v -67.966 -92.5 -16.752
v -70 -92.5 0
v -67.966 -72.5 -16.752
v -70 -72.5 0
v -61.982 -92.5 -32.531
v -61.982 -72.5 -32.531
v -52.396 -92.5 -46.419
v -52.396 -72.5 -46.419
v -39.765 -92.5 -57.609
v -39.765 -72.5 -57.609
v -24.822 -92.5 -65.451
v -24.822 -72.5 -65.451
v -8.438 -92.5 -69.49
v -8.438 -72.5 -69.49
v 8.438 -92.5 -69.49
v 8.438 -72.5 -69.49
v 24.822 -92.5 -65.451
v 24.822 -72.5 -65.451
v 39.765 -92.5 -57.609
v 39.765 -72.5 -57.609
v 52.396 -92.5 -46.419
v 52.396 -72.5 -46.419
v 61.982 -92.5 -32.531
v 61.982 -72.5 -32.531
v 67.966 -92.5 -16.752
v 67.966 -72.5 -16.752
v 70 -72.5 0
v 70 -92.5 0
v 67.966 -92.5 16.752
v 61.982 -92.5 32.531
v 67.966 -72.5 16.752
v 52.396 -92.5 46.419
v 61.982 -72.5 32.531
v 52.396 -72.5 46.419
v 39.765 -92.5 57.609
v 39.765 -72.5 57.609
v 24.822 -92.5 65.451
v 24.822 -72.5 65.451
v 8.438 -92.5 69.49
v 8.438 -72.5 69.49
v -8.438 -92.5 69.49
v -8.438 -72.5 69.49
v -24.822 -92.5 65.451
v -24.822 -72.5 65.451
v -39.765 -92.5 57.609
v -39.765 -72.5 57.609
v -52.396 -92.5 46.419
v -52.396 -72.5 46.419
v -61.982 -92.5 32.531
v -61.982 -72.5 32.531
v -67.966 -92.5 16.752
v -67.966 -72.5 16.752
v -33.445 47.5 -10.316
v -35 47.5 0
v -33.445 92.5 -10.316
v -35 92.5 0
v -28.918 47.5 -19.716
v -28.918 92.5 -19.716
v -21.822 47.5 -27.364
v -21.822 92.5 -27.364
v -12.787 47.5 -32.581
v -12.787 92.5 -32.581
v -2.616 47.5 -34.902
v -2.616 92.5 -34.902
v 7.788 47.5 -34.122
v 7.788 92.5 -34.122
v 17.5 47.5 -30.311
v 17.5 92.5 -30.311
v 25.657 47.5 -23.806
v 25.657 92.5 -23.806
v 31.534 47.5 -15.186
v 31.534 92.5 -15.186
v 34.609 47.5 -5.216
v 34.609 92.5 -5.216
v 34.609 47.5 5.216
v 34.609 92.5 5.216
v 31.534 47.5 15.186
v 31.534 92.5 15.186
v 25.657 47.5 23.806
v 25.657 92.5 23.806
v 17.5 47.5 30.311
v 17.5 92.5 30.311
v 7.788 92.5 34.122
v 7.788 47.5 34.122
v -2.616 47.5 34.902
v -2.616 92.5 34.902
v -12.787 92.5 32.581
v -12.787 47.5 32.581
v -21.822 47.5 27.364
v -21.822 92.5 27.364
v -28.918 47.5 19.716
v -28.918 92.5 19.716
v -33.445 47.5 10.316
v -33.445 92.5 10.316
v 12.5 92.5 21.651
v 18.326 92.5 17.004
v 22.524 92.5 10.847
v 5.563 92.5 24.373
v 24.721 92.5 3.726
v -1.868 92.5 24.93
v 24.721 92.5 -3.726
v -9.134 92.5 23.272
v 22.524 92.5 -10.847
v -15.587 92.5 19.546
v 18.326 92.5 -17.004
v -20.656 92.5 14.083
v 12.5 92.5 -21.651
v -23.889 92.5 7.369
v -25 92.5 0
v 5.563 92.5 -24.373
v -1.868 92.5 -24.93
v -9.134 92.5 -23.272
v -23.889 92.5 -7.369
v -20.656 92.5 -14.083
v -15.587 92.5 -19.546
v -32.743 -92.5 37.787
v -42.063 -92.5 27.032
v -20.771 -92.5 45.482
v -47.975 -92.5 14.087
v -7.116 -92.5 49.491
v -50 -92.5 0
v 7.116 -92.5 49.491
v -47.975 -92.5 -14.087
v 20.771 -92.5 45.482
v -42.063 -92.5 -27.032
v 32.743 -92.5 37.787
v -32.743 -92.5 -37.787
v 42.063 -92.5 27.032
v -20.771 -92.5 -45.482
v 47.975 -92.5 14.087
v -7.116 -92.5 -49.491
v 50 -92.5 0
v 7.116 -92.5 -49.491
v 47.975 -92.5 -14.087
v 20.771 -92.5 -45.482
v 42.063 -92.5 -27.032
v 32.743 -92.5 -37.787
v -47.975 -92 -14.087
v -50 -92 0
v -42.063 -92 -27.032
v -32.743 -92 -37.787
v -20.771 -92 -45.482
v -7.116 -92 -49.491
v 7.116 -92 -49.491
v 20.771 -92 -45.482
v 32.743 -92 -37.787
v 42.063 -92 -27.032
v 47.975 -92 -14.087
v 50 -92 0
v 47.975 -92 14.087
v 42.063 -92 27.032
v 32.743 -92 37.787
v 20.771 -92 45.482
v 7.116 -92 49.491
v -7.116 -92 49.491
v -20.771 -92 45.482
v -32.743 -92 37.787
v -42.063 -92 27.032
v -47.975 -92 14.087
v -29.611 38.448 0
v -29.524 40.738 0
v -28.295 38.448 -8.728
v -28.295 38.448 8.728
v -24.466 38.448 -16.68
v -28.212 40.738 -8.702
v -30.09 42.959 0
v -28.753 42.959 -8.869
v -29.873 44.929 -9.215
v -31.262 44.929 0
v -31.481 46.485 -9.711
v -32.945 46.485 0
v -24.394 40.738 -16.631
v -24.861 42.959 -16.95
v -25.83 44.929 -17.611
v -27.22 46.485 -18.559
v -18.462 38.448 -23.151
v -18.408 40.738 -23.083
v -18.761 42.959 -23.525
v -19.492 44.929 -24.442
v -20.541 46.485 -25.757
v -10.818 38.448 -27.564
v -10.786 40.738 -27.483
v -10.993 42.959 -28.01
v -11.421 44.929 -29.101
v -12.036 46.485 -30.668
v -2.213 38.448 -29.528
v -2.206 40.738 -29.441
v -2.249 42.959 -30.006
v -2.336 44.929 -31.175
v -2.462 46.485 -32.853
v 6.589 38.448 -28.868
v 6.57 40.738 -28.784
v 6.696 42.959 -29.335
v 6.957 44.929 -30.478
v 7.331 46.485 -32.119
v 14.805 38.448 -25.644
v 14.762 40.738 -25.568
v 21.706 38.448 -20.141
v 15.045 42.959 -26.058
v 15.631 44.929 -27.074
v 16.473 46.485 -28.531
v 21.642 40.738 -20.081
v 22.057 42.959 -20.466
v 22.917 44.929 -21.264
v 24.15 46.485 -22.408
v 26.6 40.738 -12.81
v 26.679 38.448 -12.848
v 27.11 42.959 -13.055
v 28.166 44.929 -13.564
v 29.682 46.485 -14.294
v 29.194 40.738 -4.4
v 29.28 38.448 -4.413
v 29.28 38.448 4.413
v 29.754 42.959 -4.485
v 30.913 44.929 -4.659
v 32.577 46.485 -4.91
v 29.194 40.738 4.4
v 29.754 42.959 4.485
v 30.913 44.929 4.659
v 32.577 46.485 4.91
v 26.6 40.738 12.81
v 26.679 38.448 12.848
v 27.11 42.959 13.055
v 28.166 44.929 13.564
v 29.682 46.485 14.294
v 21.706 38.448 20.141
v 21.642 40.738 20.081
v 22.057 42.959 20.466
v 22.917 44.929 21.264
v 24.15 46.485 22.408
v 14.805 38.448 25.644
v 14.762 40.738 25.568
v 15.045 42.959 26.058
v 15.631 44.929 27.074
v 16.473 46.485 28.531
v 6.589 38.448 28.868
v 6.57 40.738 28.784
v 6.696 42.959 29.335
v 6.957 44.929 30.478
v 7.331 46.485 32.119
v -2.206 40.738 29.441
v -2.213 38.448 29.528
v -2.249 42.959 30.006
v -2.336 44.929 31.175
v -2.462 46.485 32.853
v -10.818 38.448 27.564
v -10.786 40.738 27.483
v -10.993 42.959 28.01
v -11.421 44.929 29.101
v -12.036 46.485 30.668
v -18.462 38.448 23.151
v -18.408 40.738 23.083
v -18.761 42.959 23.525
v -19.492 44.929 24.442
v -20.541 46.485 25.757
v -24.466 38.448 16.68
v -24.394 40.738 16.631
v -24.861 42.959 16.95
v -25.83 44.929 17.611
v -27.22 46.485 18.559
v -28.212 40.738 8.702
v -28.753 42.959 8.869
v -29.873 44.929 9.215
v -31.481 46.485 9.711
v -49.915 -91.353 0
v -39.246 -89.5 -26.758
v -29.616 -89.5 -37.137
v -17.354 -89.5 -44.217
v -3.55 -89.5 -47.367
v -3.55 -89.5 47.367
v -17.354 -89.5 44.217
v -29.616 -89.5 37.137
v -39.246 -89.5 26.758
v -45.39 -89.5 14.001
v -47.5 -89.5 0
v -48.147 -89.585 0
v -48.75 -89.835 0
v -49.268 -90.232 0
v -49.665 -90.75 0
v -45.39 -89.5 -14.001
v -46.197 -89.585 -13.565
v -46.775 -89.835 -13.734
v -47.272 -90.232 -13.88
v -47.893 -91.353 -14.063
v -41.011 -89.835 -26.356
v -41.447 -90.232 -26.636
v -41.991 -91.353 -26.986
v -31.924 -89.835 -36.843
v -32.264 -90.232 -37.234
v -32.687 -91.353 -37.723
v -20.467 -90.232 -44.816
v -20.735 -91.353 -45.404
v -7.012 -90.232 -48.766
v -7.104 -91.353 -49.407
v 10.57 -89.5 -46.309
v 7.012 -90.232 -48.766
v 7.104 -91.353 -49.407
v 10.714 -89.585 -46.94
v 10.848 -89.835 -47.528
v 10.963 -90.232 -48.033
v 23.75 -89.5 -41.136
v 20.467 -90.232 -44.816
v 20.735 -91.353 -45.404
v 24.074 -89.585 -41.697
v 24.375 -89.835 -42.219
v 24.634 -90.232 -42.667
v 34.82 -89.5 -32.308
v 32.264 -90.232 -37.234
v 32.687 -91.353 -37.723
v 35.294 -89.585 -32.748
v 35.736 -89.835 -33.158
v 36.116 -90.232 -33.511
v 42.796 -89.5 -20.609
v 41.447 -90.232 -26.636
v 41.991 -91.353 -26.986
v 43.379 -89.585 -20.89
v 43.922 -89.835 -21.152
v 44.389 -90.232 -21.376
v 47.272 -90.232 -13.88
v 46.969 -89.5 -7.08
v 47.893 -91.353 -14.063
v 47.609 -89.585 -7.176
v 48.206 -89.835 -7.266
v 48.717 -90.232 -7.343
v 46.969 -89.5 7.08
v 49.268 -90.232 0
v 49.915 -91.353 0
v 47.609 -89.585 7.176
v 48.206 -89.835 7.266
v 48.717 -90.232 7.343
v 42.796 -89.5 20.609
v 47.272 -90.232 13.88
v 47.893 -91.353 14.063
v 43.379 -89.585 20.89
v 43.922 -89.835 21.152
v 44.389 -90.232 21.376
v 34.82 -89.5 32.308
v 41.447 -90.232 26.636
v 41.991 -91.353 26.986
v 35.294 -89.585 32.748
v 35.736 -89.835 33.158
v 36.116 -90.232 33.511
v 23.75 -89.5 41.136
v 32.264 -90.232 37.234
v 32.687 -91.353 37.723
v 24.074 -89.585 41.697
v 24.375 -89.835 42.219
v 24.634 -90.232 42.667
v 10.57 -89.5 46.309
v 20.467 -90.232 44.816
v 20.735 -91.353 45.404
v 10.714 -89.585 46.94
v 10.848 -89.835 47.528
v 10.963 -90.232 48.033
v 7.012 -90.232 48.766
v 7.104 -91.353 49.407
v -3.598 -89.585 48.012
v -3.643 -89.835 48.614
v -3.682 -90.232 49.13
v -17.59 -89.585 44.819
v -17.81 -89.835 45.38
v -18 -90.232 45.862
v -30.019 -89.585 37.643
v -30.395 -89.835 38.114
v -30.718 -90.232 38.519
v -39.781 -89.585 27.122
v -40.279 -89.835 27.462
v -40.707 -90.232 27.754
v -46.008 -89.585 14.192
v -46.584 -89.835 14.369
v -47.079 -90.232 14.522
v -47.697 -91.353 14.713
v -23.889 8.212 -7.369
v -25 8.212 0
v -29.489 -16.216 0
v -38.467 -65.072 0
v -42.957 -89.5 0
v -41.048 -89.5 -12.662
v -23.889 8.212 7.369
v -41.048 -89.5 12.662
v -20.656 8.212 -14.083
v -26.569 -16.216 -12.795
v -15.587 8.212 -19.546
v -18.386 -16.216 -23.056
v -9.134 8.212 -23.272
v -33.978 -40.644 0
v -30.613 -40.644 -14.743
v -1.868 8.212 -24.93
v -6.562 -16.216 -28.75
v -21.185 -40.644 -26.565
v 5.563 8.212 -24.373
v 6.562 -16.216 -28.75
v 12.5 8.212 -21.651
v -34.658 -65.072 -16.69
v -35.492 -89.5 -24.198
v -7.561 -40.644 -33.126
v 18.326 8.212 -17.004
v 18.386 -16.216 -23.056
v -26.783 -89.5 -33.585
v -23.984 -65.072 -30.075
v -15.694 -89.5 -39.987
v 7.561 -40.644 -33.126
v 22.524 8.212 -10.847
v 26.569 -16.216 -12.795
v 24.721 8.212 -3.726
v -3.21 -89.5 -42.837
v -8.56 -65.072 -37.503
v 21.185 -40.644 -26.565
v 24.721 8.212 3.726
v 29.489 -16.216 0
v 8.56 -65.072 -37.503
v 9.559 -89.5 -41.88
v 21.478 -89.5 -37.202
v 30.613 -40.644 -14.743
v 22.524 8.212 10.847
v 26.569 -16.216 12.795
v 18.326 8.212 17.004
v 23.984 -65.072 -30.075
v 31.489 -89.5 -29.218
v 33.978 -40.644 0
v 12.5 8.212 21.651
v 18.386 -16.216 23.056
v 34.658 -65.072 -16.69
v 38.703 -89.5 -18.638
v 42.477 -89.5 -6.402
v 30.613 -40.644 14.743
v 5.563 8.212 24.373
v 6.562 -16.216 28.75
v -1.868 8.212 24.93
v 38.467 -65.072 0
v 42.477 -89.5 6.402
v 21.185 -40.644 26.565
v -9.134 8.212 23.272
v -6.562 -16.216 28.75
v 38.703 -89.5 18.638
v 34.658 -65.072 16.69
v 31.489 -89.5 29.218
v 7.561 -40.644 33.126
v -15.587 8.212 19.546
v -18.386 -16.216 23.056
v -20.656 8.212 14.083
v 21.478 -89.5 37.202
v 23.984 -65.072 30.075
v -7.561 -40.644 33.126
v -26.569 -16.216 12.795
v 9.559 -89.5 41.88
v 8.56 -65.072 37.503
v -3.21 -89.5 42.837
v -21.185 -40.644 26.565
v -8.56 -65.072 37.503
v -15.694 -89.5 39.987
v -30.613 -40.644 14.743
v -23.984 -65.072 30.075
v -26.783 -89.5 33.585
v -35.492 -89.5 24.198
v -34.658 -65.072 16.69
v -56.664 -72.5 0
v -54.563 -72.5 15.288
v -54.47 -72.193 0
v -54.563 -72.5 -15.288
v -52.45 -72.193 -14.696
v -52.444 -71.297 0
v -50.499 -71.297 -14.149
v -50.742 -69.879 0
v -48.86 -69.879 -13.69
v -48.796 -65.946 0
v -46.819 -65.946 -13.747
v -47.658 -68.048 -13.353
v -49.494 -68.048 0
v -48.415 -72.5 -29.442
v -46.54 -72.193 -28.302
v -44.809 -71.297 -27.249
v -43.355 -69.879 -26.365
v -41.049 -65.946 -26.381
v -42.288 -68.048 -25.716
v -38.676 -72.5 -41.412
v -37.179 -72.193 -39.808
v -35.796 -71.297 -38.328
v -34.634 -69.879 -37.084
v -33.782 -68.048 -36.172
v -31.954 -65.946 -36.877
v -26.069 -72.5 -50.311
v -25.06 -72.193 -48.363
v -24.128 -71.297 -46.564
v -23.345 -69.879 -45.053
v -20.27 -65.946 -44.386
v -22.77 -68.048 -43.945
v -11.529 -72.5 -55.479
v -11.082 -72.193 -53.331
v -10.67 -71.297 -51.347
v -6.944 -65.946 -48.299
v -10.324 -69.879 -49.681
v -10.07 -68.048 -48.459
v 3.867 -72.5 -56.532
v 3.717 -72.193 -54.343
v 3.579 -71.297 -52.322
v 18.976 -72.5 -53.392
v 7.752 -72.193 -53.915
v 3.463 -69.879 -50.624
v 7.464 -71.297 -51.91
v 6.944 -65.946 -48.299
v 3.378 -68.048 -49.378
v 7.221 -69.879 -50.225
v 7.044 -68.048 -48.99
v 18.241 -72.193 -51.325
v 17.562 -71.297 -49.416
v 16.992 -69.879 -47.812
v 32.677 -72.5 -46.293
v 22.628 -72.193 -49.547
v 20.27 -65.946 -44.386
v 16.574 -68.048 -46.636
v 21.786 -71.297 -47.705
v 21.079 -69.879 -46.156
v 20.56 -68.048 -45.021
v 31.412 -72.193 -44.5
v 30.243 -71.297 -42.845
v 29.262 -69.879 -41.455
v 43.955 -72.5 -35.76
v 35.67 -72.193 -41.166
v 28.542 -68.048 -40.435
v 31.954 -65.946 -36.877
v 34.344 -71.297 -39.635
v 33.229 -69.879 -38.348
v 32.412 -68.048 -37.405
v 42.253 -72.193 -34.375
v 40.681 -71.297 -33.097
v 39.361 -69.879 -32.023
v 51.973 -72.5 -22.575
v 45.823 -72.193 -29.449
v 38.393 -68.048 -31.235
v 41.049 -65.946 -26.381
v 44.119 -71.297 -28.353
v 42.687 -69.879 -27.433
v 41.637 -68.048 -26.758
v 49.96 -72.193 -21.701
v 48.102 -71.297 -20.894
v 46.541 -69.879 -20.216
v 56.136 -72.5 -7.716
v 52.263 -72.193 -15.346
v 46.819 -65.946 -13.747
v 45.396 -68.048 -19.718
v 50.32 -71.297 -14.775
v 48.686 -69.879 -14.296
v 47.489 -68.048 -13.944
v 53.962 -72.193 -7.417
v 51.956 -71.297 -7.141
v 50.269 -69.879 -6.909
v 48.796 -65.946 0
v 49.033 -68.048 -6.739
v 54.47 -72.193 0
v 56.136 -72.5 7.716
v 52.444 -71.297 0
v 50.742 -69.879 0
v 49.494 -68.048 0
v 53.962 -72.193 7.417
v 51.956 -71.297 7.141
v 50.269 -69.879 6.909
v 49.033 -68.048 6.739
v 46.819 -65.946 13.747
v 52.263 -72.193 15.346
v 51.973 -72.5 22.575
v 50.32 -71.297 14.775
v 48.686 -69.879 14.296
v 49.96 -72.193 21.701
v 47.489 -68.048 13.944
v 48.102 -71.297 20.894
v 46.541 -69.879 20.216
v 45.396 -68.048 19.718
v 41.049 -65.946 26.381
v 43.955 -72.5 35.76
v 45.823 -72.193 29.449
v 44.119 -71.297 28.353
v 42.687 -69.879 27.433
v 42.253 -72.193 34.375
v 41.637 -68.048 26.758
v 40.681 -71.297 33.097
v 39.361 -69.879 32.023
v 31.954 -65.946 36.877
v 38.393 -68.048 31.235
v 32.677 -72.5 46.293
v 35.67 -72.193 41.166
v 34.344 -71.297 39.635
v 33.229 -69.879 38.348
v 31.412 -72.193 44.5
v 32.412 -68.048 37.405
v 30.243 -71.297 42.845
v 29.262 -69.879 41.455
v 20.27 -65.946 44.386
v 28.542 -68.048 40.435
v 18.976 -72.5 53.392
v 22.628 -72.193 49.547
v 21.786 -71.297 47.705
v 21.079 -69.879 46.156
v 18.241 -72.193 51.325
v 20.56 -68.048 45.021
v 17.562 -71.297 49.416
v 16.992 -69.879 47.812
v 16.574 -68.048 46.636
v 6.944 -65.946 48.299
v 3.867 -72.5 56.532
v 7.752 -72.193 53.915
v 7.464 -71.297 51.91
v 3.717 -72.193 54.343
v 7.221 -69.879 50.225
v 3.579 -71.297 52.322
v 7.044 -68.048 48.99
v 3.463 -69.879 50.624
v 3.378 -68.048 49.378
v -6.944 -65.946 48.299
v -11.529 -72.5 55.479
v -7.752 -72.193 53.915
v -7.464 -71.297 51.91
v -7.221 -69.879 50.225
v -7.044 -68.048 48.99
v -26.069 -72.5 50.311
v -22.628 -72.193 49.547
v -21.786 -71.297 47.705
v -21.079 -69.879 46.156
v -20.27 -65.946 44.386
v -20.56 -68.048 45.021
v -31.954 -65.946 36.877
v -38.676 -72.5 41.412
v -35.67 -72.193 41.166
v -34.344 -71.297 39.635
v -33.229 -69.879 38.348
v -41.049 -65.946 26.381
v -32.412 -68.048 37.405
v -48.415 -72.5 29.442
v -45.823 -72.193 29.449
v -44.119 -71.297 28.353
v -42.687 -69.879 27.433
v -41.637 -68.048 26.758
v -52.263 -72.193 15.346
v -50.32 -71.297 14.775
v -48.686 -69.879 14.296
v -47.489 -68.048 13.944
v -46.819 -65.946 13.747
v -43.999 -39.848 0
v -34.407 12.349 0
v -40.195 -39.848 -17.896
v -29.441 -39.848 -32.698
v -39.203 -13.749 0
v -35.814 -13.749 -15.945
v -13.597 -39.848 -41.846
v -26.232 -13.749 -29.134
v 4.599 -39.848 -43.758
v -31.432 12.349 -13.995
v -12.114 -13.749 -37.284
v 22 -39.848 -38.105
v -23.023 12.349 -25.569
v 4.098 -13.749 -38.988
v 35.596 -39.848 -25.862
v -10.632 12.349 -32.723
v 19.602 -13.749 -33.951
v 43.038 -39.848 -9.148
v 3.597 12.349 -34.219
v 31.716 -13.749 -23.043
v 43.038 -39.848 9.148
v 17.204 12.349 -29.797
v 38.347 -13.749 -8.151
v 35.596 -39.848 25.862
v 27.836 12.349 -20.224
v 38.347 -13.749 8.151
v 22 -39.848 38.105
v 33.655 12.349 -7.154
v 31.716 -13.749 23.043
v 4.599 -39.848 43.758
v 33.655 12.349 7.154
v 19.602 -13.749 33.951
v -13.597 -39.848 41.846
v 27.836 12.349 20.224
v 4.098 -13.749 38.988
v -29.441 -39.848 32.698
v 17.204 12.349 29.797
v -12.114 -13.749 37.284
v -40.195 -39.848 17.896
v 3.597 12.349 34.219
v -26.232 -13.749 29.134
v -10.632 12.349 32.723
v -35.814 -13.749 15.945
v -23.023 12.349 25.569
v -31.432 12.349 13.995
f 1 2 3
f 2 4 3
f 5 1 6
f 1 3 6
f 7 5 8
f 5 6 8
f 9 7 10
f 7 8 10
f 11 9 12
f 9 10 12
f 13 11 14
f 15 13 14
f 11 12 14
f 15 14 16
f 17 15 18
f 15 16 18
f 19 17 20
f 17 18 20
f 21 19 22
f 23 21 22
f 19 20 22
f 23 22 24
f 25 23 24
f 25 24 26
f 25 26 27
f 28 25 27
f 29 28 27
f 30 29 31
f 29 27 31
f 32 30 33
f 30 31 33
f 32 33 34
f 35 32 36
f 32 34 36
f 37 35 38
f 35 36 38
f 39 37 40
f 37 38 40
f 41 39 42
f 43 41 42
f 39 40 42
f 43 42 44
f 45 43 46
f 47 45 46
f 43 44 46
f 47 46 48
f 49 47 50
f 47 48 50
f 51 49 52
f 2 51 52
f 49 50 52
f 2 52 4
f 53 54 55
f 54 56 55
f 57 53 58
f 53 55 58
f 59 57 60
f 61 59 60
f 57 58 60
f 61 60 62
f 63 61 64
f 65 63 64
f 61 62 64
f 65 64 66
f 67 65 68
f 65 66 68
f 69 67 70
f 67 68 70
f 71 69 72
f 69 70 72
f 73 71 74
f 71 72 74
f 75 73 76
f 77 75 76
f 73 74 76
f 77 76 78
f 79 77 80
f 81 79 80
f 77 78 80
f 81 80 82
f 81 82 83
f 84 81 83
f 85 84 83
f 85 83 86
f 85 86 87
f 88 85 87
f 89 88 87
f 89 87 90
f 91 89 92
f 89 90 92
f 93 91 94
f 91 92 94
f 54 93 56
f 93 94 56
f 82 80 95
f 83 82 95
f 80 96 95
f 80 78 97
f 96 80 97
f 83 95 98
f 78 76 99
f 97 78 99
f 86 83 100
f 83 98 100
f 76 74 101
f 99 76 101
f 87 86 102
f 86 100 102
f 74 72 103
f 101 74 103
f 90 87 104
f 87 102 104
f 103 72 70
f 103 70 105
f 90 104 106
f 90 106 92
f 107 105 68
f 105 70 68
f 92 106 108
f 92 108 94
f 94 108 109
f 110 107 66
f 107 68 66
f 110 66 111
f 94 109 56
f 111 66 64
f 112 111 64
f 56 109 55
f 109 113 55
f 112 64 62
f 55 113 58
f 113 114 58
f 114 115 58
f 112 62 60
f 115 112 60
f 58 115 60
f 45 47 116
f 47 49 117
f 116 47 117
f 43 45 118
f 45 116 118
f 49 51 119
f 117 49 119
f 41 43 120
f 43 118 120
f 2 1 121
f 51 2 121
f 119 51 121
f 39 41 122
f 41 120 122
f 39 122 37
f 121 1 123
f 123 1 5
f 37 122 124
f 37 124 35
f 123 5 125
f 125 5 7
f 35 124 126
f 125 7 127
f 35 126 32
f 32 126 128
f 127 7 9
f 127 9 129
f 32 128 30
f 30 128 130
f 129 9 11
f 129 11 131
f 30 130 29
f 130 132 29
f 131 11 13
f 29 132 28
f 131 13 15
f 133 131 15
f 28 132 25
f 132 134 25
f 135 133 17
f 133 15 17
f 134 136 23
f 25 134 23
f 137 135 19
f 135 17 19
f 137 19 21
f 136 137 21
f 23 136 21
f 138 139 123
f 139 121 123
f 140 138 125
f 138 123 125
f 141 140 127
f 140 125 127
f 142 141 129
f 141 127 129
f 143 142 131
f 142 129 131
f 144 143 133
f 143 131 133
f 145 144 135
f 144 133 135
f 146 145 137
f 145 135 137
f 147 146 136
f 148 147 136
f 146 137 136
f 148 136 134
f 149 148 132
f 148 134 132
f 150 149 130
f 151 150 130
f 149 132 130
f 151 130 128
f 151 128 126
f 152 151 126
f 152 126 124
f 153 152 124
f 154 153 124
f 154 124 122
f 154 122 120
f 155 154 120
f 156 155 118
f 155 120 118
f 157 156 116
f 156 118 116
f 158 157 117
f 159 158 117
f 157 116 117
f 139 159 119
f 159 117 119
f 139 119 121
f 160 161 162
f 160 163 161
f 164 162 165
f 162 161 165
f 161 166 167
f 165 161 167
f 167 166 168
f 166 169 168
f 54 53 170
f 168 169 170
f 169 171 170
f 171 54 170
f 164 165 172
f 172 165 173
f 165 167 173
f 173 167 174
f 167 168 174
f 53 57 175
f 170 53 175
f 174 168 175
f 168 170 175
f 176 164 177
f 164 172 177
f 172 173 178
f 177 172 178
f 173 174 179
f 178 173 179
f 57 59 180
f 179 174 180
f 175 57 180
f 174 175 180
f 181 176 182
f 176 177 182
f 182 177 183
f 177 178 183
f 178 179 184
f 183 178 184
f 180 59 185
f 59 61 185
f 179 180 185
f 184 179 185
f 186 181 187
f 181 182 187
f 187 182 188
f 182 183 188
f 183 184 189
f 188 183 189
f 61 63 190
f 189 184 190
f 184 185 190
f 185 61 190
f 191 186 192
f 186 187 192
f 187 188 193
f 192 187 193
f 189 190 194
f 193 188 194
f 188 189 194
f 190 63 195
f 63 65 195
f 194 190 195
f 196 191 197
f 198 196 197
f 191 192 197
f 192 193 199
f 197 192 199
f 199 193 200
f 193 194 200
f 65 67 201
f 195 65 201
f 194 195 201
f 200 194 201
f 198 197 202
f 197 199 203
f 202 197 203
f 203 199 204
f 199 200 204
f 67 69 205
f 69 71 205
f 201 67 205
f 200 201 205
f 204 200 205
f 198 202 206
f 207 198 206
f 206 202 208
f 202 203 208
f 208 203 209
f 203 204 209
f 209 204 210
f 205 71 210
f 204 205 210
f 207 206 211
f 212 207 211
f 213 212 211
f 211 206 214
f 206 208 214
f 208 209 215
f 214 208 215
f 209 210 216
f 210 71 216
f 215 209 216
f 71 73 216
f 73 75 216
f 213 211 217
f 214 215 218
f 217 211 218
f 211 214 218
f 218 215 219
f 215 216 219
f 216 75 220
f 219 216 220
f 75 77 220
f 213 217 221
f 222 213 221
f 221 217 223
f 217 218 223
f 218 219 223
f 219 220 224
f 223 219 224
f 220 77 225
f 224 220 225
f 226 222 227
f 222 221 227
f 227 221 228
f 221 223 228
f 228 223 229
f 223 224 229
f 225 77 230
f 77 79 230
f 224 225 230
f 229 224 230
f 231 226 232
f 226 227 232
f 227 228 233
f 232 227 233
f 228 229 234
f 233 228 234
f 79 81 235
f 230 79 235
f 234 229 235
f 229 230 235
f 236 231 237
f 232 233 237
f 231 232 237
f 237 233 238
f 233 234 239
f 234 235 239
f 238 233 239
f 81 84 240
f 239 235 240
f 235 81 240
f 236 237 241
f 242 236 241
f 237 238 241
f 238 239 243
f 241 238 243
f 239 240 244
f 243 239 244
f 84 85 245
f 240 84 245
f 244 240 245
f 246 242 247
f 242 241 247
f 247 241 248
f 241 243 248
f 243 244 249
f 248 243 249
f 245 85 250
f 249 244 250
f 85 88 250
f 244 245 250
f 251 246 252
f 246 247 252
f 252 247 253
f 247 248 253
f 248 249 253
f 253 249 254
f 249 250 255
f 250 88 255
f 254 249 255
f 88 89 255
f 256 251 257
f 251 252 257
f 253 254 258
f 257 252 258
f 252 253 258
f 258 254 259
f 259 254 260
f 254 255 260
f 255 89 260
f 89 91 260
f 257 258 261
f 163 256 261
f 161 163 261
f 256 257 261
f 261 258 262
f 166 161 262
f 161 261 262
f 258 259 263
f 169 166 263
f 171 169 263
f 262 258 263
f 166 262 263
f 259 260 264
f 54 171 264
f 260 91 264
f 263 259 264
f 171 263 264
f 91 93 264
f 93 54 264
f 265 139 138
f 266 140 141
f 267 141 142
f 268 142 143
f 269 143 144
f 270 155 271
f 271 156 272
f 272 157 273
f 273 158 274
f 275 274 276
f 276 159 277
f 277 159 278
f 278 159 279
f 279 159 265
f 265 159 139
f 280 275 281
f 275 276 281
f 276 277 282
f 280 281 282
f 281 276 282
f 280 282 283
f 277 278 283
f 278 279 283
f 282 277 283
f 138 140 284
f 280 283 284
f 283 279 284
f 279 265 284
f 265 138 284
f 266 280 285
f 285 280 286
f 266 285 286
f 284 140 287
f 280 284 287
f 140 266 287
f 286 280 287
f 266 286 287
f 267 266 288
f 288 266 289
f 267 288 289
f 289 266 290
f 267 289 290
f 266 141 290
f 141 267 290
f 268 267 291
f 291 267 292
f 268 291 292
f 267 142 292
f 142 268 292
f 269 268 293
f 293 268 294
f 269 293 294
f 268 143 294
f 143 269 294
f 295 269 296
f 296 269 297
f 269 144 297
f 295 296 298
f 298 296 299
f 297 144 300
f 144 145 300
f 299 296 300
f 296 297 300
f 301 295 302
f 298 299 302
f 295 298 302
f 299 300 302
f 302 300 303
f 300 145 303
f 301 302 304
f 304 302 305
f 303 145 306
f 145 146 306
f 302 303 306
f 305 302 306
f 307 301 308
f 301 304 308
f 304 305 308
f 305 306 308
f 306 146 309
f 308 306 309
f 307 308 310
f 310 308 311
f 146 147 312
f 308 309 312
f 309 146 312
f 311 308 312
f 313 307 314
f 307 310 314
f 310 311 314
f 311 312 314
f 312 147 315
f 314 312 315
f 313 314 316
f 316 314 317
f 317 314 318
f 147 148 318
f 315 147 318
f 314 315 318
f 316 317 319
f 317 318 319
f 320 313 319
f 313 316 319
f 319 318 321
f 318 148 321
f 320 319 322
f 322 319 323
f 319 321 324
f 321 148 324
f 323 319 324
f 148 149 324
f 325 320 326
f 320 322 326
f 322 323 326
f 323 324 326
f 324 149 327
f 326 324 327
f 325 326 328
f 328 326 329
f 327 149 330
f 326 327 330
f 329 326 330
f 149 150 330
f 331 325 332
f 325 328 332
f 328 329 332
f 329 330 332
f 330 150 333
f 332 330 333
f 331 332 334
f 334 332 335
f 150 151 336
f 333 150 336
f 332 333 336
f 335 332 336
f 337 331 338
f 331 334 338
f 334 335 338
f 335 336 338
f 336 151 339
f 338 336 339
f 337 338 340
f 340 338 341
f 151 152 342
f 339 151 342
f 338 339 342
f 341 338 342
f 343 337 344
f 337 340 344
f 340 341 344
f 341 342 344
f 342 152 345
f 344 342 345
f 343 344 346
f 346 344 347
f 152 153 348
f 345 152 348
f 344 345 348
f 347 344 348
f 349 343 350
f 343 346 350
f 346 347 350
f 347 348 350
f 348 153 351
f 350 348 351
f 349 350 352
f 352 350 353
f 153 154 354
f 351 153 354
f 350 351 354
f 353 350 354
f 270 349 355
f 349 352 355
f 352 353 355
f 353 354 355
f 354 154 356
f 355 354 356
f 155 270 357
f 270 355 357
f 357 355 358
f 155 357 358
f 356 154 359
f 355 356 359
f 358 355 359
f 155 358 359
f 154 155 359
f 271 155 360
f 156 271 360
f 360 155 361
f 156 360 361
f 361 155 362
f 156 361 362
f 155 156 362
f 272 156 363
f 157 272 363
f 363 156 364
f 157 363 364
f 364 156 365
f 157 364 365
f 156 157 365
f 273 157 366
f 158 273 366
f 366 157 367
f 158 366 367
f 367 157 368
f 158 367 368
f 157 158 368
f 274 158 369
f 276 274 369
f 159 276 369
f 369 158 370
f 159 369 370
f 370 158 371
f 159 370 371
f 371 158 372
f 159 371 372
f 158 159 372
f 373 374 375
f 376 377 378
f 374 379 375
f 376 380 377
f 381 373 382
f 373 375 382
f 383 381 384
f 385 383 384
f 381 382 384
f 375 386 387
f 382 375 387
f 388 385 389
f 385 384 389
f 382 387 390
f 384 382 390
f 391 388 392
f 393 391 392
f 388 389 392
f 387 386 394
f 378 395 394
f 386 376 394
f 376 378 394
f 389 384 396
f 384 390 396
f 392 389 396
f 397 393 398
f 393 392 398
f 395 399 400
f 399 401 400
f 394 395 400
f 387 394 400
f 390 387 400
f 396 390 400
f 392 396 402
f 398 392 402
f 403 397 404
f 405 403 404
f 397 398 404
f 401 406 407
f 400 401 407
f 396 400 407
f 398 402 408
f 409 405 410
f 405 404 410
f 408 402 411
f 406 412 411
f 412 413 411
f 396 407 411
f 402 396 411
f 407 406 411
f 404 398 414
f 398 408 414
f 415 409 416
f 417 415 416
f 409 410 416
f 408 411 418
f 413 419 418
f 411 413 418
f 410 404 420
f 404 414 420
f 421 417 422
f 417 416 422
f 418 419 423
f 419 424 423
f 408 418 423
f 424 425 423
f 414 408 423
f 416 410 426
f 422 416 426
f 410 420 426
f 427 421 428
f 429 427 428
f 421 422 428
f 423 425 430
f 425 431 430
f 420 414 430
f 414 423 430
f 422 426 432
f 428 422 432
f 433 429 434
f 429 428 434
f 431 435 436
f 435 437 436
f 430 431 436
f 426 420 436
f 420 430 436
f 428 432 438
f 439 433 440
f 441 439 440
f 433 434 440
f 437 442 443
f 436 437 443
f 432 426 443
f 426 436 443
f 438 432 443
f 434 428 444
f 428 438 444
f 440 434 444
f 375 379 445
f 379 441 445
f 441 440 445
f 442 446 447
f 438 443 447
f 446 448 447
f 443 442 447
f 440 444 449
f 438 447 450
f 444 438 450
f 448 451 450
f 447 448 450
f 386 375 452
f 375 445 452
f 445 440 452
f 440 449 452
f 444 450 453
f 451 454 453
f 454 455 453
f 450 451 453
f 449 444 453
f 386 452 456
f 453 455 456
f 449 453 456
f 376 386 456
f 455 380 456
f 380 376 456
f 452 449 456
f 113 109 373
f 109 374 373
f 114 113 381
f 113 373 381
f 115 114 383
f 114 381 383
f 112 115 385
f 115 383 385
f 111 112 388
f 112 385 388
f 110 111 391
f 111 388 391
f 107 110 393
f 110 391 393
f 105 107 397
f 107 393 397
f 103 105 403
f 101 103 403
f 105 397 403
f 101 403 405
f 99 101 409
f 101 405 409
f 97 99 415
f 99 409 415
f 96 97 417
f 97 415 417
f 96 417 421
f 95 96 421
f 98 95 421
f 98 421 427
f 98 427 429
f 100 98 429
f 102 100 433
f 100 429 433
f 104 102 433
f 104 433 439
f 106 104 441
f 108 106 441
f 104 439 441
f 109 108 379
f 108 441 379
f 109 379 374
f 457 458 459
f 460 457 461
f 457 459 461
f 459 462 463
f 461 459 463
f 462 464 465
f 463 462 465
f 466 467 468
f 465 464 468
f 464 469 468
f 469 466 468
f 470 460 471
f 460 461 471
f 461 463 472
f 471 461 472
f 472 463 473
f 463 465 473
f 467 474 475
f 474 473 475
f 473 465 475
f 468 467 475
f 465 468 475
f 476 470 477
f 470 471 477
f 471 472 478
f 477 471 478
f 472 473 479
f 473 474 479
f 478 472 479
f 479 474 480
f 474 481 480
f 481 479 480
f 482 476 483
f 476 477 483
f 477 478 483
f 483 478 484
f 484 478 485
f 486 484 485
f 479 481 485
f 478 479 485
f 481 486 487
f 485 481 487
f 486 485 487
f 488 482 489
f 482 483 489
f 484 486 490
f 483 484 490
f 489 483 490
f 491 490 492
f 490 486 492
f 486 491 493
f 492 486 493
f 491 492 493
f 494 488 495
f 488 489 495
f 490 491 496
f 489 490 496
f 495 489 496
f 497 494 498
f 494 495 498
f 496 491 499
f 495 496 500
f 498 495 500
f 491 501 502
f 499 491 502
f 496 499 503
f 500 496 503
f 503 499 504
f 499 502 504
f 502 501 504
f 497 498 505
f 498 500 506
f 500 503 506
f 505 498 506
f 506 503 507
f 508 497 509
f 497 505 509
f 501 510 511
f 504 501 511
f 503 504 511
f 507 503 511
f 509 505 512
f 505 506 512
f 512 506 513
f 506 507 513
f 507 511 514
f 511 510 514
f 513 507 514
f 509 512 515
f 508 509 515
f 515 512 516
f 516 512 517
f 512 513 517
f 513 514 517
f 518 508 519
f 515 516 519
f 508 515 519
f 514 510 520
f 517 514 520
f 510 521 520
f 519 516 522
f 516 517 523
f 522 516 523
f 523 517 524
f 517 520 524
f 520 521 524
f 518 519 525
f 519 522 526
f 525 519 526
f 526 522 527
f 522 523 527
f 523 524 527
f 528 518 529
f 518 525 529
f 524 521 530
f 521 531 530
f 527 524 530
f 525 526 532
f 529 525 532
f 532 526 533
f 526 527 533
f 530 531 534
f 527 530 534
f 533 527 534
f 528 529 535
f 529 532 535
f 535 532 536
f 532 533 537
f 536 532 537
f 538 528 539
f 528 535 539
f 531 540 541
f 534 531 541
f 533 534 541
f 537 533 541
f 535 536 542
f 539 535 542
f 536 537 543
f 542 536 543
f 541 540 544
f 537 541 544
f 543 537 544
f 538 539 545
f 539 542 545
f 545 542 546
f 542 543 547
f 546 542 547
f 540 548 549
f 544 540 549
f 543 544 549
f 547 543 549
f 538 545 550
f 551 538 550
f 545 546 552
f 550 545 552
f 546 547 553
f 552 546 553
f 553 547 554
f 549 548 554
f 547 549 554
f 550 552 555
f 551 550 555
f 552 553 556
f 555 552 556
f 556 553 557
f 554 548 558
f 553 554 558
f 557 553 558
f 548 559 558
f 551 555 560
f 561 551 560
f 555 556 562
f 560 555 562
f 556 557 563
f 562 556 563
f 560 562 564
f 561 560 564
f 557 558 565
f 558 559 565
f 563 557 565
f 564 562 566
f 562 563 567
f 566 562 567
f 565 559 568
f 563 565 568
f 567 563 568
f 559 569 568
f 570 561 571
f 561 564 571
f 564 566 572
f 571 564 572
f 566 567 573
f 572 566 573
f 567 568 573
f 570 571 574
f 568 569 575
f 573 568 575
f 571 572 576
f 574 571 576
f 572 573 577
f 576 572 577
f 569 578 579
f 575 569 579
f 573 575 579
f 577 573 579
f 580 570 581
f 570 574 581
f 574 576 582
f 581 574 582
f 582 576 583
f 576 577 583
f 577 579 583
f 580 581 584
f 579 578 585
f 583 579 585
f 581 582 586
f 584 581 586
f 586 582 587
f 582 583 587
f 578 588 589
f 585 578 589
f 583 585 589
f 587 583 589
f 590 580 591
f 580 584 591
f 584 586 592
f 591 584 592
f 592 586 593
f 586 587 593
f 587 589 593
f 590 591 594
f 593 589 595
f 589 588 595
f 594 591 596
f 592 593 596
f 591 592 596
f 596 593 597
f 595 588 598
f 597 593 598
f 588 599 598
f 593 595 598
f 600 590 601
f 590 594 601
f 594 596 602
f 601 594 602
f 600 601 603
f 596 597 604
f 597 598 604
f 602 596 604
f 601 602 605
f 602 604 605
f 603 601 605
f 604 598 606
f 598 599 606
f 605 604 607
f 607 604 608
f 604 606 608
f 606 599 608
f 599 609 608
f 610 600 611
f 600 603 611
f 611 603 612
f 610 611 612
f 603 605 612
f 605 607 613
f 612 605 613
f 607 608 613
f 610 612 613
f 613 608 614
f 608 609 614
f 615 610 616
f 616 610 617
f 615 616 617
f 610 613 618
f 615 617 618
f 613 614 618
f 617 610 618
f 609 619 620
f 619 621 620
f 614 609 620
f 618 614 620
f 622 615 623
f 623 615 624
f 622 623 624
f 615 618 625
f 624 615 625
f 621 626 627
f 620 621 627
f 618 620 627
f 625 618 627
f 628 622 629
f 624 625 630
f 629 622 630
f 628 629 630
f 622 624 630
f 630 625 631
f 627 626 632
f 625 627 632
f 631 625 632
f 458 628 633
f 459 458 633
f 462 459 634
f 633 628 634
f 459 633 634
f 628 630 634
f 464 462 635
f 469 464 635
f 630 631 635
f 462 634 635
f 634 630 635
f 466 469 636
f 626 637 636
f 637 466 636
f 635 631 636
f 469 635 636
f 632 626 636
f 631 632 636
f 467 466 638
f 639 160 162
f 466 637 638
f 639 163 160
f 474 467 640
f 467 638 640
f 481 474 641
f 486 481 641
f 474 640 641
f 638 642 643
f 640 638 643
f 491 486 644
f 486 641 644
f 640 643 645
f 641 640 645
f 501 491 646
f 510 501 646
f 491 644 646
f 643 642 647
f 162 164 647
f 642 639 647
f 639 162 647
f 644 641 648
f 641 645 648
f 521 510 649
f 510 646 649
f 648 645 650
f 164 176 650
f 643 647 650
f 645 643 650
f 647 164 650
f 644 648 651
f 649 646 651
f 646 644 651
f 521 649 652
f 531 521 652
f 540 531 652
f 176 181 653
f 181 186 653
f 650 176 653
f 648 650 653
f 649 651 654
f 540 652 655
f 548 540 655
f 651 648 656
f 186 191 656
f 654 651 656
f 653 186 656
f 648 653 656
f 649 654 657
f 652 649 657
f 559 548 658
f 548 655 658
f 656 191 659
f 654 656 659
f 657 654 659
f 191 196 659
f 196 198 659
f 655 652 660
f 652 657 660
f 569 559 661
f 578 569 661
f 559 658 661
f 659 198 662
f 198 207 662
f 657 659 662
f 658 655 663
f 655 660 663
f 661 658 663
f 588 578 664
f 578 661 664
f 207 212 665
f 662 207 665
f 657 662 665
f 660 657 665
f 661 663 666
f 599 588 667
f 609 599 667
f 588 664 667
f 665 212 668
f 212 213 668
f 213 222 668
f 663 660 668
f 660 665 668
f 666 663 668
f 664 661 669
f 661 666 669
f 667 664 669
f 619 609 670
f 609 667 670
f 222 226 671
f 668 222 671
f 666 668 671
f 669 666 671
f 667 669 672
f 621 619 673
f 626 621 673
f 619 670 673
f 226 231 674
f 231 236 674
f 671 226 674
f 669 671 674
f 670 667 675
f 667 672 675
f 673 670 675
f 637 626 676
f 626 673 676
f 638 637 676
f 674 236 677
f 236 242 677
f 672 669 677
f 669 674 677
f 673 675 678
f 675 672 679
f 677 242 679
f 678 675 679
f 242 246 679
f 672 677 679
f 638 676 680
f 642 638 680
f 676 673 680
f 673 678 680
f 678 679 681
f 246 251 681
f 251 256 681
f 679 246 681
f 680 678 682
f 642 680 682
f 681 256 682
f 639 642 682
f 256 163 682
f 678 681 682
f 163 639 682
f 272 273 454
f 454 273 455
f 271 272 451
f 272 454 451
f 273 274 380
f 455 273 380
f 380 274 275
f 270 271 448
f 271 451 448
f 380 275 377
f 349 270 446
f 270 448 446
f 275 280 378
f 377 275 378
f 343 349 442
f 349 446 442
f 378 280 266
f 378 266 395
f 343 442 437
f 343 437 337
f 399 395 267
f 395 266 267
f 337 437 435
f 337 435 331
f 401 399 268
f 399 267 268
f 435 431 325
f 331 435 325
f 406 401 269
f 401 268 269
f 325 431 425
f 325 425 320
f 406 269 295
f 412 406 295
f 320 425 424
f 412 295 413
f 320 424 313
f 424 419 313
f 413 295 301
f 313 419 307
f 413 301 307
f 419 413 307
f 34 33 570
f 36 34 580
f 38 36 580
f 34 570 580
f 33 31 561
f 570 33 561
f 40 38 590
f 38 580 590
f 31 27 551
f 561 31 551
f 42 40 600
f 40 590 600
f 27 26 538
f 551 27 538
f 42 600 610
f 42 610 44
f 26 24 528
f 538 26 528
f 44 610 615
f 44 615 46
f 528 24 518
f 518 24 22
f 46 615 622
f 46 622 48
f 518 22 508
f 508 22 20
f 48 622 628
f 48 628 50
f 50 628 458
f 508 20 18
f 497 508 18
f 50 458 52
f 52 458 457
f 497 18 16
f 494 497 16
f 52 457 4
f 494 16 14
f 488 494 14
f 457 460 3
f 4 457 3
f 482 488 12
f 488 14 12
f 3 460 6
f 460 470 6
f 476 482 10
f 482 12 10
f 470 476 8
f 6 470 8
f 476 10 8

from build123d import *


with BuildPart() as part:
    # Sketch3 → Revolve1 (revolve)
    with BuildSketch(Plane.XY, mode=Mode.PRIVATE) as revolve1_sk:
        with BuildLine():
            Line((25, 92.5), (25, 8.21170714))
            Line((25, 8.21170714), (42.956663453, -89.5))
            Line((42.956663453, -89.5), (47.5, -89.5))
            ThreePointArc((47.5, -89.5), (49.267766953, -90.232233047), (50, -92))
            Line((50, -92), (50, -92.5))
            Line((50, -92.5), (70, -92.5))
            Line((70, -92.5), (70, -72.5))
            Line((70, -72.5), (56.663791728, -72.5))
            ThreePointArc((56.663791728, -72.5), (51.543620306, -70.646856482), (48.795552004, -65.945961153))
            Line((48.795552004, -65.945961153), (29.610902689, 38.447866821))
            ThreePointArc((29.610902689, 38.447866821), (30.60510735, 43.986216269), (35, 47.5))
            Line((35, 47.5), (35, 92.5))
            Line((35, 92.5), (25, 92.5))
        make_face()
    revolve(revolve1_sk.sketch.rotate(Axis((0, 92.5, 0), (0, -1, 0)), 180), axis=Axis((0, 92.5, 0), (0, -1, 0)))


solid = part.part
